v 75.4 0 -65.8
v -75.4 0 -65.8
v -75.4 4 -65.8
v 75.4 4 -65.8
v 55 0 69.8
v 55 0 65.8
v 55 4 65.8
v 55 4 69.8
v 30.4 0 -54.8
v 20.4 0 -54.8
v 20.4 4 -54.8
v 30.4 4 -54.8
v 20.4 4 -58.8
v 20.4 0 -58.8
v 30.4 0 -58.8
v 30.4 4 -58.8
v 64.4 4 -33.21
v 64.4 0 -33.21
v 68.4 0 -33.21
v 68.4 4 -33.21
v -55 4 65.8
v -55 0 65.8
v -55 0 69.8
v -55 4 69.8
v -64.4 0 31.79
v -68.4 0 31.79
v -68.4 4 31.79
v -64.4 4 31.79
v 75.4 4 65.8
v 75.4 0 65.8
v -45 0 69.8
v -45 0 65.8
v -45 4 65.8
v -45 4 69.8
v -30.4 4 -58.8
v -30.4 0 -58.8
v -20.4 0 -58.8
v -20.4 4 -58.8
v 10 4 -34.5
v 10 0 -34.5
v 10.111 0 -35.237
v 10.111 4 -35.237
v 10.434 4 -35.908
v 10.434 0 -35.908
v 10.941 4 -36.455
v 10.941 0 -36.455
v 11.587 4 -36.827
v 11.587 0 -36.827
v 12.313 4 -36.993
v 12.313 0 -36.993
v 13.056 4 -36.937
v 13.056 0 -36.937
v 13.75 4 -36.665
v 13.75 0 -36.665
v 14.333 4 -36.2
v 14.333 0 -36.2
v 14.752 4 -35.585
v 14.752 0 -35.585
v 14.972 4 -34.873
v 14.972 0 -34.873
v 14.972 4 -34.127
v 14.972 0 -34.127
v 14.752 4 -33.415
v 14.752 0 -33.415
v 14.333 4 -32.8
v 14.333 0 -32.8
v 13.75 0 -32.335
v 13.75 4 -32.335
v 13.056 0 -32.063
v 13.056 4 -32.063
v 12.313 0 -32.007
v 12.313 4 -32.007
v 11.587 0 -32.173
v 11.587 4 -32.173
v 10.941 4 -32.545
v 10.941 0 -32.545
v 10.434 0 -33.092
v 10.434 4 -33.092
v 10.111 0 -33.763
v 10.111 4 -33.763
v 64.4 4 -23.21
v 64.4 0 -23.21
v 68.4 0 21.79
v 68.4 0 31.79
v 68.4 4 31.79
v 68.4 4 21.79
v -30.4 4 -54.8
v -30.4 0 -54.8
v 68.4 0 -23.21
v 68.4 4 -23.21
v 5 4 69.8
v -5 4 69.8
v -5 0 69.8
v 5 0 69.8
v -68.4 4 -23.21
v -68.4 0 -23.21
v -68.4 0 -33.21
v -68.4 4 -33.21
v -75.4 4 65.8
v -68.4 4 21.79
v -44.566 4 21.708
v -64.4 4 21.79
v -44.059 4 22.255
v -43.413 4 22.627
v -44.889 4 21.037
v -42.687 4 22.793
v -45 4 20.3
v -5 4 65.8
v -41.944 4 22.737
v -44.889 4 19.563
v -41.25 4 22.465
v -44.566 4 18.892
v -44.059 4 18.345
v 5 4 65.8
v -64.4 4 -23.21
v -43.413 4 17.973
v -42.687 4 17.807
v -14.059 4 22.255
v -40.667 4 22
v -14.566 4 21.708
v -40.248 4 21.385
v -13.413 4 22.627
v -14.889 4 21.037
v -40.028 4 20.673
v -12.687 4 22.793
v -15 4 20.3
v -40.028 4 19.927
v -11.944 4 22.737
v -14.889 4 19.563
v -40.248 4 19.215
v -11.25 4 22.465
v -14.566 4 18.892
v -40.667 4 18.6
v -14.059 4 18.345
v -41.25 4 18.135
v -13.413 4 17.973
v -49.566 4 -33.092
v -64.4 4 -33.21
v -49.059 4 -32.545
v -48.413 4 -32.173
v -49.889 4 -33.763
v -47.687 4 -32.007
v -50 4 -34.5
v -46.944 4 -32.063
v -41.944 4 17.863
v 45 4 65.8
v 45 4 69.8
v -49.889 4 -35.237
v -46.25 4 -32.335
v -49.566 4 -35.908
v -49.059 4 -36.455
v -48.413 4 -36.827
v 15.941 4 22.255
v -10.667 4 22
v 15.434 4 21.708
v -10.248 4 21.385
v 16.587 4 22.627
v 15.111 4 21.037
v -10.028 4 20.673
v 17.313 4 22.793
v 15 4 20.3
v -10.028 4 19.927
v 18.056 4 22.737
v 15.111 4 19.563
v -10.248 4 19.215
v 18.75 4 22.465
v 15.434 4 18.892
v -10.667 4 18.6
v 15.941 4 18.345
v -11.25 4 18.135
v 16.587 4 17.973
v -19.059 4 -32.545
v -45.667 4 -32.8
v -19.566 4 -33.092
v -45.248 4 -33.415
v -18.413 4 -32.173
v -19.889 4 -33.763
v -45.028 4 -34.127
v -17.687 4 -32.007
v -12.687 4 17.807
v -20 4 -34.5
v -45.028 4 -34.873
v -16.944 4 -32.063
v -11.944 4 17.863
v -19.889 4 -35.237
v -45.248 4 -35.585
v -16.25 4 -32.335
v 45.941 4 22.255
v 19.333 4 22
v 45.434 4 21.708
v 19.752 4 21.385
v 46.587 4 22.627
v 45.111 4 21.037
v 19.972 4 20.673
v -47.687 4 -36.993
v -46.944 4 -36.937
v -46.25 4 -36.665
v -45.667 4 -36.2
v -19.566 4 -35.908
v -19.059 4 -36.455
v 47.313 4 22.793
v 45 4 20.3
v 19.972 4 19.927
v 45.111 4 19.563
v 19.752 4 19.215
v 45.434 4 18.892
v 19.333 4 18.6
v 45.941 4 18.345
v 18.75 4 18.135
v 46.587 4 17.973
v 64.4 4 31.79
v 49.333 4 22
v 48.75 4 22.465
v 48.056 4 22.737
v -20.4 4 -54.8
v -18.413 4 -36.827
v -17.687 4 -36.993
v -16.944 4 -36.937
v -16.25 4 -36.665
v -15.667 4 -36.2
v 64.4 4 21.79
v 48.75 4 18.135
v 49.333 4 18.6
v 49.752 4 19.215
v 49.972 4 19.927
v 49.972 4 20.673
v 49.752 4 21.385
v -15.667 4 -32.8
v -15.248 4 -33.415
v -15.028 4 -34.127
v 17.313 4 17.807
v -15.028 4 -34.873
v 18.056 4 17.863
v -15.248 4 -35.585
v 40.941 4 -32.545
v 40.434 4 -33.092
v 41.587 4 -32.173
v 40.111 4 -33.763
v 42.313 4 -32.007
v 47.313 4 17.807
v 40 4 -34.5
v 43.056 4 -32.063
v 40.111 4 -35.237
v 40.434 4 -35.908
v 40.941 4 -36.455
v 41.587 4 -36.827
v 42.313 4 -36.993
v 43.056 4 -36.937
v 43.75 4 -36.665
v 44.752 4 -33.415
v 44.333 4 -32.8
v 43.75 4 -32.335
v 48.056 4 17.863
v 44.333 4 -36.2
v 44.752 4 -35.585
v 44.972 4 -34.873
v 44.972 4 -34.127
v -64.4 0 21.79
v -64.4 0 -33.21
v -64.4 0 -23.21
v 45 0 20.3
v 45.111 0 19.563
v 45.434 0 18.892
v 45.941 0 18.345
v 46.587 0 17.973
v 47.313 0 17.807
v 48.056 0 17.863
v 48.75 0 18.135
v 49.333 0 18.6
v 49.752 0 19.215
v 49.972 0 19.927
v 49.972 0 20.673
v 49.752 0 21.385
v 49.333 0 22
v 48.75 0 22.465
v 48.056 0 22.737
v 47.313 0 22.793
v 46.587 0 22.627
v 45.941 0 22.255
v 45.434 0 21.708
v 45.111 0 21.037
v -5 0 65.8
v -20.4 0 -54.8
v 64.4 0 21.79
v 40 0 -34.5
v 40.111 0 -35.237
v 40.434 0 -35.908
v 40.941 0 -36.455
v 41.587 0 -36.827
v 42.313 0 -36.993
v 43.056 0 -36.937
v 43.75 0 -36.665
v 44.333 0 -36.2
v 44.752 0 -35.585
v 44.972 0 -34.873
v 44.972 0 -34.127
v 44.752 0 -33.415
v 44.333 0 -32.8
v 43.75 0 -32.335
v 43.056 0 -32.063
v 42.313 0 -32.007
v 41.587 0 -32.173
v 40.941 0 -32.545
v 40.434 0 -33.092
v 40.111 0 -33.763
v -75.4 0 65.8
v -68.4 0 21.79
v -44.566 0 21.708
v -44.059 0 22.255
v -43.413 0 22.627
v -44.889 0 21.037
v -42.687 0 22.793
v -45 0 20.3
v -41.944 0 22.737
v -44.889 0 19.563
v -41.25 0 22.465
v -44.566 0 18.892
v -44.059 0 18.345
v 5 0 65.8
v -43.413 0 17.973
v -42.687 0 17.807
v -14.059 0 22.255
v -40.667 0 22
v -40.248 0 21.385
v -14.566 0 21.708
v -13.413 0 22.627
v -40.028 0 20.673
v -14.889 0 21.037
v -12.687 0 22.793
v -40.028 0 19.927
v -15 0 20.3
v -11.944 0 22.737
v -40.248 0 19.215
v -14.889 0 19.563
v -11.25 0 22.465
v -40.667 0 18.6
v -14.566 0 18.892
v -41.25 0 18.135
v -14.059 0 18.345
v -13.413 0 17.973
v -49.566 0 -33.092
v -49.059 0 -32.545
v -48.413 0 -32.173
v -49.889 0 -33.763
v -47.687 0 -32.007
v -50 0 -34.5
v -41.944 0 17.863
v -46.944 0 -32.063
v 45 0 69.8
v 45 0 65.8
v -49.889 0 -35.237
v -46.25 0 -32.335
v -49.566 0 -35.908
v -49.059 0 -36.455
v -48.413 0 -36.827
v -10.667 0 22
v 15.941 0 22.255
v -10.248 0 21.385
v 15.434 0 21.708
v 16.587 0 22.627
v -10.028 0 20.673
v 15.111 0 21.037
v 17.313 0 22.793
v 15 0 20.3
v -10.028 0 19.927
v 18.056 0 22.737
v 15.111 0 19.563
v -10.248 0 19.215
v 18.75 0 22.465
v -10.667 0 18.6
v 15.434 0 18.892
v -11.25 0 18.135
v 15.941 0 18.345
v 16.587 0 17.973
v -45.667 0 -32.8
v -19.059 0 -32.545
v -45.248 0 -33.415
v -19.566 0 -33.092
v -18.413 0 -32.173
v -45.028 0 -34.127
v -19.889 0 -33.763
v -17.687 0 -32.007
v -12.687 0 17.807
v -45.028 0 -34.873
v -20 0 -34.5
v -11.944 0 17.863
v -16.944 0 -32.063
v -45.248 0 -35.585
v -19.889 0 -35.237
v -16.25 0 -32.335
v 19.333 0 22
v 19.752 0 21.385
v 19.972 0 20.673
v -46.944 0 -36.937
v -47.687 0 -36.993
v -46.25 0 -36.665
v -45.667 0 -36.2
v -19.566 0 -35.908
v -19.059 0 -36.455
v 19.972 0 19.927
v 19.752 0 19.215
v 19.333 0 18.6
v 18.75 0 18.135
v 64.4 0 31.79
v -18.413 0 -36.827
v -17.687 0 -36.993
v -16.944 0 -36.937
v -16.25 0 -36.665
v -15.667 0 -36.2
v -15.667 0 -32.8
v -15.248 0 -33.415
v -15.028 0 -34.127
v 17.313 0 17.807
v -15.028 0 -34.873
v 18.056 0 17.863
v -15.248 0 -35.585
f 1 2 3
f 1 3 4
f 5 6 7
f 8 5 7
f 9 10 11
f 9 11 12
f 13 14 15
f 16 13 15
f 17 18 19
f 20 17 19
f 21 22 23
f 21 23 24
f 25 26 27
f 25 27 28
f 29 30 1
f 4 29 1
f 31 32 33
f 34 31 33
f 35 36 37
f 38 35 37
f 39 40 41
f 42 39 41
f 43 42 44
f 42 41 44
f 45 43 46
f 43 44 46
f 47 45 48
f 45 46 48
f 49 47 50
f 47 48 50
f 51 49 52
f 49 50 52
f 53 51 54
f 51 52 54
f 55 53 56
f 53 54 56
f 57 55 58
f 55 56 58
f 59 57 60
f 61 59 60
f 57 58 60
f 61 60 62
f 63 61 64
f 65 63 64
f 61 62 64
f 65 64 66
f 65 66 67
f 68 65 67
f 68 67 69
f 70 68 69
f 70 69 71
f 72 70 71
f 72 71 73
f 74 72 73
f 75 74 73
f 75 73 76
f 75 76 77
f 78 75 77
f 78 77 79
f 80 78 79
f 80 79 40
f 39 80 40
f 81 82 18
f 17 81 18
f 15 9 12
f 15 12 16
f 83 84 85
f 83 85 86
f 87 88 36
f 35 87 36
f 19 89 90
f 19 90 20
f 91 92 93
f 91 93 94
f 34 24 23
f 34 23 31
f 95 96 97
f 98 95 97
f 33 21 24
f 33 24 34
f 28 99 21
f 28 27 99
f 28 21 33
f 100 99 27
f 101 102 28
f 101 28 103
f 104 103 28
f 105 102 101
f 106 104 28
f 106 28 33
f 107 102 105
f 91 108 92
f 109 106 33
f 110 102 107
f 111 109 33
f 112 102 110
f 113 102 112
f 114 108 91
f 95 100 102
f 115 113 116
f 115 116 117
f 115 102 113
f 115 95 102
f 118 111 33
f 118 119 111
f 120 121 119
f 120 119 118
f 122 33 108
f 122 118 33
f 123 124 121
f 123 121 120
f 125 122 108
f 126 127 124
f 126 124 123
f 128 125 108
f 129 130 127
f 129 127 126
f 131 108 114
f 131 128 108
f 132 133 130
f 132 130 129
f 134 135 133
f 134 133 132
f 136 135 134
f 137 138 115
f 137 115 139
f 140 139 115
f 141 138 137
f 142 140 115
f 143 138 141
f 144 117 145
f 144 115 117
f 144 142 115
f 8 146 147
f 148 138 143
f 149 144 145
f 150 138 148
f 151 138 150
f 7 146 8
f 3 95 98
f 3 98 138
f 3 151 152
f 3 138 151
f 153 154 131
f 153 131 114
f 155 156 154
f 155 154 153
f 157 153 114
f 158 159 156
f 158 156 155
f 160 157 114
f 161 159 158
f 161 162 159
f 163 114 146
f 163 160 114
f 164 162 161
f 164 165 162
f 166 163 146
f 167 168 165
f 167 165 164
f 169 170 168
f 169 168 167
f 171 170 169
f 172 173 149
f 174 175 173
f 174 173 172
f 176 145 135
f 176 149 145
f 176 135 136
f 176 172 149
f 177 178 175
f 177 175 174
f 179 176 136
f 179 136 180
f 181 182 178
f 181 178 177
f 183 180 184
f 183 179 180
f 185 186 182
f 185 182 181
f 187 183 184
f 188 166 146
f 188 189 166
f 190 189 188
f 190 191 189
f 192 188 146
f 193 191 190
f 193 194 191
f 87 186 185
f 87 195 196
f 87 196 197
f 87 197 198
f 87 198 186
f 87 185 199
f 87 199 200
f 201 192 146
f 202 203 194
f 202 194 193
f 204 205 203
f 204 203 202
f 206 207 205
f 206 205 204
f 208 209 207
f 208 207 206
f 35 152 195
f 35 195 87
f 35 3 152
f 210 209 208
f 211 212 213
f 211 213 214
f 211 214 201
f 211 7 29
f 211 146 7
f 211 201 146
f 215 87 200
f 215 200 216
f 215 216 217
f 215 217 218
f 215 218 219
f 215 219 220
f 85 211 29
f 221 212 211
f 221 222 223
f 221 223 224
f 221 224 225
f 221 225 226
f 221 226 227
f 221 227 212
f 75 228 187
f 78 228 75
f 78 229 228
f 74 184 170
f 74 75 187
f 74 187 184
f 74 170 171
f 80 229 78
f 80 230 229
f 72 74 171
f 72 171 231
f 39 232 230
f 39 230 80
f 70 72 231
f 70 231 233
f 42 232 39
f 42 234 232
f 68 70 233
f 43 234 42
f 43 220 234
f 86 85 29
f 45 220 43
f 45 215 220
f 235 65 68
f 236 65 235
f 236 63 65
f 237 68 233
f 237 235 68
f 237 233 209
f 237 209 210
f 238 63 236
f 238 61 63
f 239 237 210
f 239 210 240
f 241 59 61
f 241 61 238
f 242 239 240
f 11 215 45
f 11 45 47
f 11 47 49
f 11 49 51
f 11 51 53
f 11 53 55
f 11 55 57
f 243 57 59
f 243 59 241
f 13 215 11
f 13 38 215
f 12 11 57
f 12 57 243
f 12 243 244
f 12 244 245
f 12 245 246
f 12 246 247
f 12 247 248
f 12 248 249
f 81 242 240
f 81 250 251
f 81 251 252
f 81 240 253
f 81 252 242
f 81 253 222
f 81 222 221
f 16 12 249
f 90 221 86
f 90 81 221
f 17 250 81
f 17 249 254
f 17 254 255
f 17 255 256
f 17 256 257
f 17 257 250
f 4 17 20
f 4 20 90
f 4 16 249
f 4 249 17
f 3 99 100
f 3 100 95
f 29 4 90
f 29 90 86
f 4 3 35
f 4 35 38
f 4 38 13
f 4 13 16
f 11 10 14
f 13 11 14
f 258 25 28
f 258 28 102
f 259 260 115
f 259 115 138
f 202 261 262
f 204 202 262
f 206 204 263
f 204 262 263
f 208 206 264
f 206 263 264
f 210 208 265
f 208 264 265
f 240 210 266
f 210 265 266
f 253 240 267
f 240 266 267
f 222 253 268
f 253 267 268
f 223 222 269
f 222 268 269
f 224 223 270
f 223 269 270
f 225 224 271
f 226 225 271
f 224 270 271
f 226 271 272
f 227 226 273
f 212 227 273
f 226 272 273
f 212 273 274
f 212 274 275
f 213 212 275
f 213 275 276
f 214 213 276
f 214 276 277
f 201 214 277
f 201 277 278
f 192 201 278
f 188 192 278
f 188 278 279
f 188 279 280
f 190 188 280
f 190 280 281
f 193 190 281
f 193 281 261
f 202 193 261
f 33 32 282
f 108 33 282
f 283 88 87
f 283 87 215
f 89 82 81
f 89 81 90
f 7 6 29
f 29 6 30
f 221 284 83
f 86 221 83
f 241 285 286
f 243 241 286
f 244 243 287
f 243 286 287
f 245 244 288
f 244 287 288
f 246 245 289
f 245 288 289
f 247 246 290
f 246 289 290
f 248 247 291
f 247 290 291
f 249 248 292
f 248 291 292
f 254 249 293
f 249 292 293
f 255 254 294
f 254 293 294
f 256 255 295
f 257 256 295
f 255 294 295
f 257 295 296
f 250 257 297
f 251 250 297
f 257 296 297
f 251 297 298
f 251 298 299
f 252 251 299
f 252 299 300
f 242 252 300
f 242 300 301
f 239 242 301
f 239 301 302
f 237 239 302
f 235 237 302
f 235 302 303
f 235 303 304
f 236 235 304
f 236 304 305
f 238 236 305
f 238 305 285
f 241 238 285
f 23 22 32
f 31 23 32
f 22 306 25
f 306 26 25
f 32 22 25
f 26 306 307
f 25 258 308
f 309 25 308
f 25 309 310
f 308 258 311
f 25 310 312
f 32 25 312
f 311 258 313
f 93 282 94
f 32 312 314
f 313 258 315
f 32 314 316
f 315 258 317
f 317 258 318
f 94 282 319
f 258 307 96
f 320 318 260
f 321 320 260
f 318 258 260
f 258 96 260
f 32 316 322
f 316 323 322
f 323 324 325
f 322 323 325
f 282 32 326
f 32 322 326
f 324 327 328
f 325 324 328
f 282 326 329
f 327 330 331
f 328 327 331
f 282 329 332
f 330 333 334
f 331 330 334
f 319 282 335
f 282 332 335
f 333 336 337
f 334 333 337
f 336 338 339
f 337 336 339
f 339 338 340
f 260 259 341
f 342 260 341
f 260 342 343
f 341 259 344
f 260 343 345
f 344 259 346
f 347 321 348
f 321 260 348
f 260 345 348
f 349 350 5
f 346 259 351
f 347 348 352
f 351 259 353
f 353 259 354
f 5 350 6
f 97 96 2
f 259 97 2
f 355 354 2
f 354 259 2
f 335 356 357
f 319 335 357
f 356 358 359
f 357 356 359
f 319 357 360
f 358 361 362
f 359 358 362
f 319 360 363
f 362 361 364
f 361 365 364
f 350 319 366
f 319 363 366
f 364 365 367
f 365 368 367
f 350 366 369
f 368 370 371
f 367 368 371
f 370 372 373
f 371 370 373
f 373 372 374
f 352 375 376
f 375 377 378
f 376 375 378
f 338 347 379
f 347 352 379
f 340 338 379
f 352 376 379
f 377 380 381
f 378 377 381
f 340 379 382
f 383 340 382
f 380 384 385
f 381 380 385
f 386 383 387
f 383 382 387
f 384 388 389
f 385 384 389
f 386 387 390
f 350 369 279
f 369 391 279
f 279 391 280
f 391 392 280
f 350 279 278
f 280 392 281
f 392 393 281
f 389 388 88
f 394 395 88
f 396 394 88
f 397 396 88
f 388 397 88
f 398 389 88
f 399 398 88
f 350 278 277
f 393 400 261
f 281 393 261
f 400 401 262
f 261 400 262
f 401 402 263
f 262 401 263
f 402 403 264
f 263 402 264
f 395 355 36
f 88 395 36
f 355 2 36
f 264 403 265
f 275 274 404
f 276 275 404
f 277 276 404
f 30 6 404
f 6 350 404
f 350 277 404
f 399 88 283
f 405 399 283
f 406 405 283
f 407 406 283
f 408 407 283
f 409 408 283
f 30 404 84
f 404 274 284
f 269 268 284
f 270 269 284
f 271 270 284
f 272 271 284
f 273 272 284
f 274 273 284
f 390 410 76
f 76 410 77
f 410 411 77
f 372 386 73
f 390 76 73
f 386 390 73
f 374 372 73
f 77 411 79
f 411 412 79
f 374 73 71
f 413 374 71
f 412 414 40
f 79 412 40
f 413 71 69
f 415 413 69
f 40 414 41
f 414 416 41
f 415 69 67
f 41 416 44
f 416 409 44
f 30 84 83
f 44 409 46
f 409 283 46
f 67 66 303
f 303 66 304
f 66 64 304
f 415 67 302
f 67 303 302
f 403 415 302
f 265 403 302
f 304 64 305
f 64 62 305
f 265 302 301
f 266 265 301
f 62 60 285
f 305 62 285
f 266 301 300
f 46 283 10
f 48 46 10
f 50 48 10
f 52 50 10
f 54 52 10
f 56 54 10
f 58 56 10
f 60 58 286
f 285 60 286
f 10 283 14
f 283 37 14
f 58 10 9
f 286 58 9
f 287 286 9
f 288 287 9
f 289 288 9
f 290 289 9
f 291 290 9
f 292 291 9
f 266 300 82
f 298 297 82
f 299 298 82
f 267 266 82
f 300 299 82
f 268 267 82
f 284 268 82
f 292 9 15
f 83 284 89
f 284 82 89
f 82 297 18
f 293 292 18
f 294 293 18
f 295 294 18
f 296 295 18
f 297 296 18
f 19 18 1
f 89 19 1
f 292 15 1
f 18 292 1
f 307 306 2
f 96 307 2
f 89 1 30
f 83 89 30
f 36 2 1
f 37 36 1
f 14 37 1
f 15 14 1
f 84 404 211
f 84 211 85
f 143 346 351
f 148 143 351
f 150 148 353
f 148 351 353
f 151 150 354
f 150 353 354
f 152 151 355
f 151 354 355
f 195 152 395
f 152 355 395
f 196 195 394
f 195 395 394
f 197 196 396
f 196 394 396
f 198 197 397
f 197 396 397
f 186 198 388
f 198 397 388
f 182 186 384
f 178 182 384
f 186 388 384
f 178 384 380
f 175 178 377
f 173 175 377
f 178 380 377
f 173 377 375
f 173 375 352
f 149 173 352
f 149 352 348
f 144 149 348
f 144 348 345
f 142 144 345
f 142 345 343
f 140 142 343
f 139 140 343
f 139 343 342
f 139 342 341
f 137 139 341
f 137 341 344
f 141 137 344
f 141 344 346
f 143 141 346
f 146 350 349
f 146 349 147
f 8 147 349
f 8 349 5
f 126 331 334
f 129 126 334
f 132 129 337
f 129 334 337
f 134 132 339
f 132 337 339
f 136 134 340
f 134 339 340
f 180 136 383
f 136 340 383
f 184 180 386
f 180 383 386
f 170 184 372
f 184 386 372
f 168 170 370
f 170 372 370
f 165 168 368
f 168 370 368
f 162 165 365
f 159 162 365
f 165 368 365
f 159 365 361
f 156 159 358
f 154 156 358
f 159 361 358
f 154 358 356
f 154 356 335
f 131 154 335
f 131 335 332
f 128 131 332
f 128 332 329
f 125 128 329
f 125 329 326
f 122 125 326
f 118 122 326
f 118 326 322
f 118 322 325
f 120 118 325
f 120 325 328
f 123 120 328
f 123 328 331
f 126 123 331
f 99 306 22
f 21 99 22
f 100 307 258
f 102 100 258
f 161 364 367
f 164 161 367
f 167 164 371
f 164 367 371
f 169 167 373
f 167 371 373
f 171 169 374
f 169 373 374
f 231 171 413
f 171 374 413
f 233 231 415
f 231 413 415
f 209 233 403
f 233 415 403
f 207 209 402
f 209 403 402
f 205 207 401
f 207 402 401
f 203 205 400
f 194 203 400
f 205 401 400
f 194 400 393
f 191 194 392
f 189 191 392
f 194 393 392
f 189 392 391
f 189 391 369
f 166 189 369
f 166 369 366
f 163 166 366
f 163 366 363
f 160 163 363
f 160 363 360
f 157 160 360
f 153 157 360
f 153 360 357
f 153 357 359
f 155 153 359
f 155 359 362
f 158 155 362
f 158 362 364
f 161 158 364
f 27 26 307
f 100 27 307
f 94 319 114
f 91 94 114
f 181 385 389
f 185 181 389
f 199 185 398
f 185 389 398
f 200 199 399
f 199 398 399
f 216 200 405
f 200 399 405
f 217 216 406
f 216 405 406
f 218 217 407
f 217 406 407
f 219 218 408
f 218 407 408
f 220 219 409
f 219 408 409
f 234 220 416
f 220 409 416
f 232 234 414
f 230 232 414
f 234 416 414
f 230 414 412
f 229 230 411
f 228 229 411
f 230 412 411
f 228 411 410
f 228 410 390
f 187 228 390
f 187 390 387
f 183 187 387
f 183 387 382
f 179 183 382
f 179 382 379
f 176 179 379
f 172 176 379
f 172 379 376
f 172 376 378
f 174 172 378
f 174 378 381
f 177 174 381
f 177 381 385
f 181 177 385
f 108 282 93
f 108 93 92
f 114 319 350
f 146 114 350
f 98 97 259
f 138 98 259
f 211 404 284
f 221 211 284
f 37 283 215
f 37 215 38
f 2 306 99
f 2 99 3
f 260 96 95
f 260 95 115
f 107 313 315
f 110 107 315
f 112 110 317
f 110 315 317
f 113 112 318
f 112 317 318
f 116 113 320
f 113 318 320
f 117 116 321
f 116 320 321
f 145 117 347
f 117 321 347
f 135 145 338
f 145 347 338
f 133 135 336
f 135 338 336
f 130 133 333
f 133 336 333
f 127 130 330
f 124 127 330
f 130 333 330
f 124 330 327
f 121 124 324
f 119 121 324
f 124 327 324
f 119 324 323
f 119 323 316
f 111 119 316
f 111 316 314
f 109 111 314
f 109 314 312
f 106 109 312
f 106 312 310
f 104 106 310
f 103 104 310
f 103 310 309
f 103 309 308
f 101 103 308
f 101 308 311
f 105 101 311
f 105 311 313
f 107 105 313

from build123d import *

# Parameters (mm, degrees)
SKETCH1_W               = 150.8
SKETCH1_H               = 131.6
BOSS_EXTRUDE1_DEPTH     = 4
F_5_0MM_DOWEL_HOLE1_D   = 5
F_5_0MM_DOWEL_HOLE2_D   = 5
CAVITY1_START           = -58.8
CAVITY1_OUTLINE_W       = 10
CAVITY1_OUTLINE_H       = 3.997862951
CAVITY1_DEPTH           = 4
CAVITY1_START_2         = -33.210330997
CAVITY1_2_OUTLINE_W     = 4
CAVITY1_2_OUTLINE_H     = 3.997862951
CAVITY1_2_DEPTH         = 10
CAVITY1_START_3         = 21.789669003
CAVITY1_3_OUTLINE_W     = 4
CAVITY1_3_OUTLINE_H     = 3.997862951
CAVITY1_3_DEPTH         = 10
CUT_EXTRUDE6_DEPTH      = 101.153796274
CUT_EXTRUDE6_DEPTH_BACK = 101.153796274
SKETCH14_W              = 4
SKETCH14_H              = 10
SKETCH14_W_2            = 10
SKETCH14_H_2            = 4
SKETCH15_W              = 10
SKETCH15_H              = 4
BOSS_EXTRUDE2_DEPTH     = 4


# Read off the part's stored shape, not the designer's step: Cavity1
with BuildPart() as part:
    # Sketch1 → Boss-Extrude1 (new body)
    with BuildSketch(Plane(origin=(0, 0, 0), x_dir=(1, 0, 0), z_dir=(0, 1, 0))):
        Rectangle(SKETCH1_W, SKETCH1_H)
    extrude(amount=BOSS_EXTRUDE1_DEPTH)

    # Ø5.0mm Dowel Hole1 (through all)
    with Locations(Plane(origin=(0, 4, 0), x_dir=(1, 0, 0), z_dir=(0, 1, 0))):
        with Locations((-42.5, -20.3)):
            Hole(F_5_0MM_DOWEL_HOLE1_D / 2)

    # Ø5.0mm Dowel Hole2 (through all)
    with Locations(Plane(origin=(0, 4, 0), x_dir=(1, 0, 0), z_dir=(0, 1, 0))):
        with Locations((-12.5, -20.3), (17.5, -20.3), (47.5, -20.3), (-47.5, 34.5), (-17.5, 34.5), (12.5, 34.5), (42.5, 34.5)):
            Hole(F_5_0MM_DOWEL_HOLE2_D / 2)

    # Cavity1 outline → Cavity1 (cut)
    with BuildSketch(Plane.XY.offset(CAVITY1_START)):
        with Locations((25.4, 2.001068524)):
            Rectangle(CAVITY1_OUTLINE_W, CAVITY1_OUTLINE_H)
        with Locations((-25.4, 2.001068524)):
            Rectangle(CAVITY1_OUTLINE_W, CAVITY1_OUTLINE_H)
    extrude(amount=CAVITY1_DEPTH, mode=Mode.SUBTRACT)

    # Cavity1 2 outline → Cavity1 2 (cut)
    with BuildSketch(Plane.XY.offset(CAVITY1_START_2)):
        with Locations((-66.4, 2.001068524)):
            Rectangle(CAVITY1_2_OUTLINE_W, CAVITY1_2_OUTLINE_H)
        with Locations((66.4, 2.001068524)):
            Rectangle(CAVITY1_2_OUTLINE_W, CAVITY1_2_OUTLINE_H)
    extrude(amount=CAVITY1_2_DEPTH, mode=Mode.SUBTRACT)

    # Cavity1 3 outline → Cavity1 3 (cut)
    with BuildSketch(Plane.XY.offset(CAVITY1_START_3)):
        with Locations((-66.4, 2.001068524)):
            Rectangle(CAVITY1_3_OUTLINE_W, CAVITY1_3_OUTLINE_H)
        with Locations((66.4, 2.001068524)):
            Rectangle(CAVITY1_3_OUTLINE_W, CAVITY1_3_OUTLINE_H)
    extrude(amount=CAVITY1_3_DEPTH, mode=Mode.SUBTRACT)

    # Sketch14 → Cut-Extrude6 (cut, two sides: drawn at the far end of the back side and taken through both)
    with BuildSketch(Plane(origin=(0, 0.002137049, 0), x_dir=(1, 0, 0), z_dir=(0, 1, 0)).offset(-CUT_EXTRUDE6_DEPTH_BACK)):
        with Locations((-66.4, -26.789669003)):
            Rectangle(SKETCH14_W, SKETCH14_H)
        with Locations((-66.4, 28.210330997)):
            Rectangle(SKETCH14_W, SKETCH14_H)
        with Locations((25.4, 56.8)):
            Rectangle(SKETCH14_W_2, SKETCH14_H_2)
        with Locations((-25.4, 56.8)):
            Rectangle(SKETCH14_W_2, SKETCH14_H_2)
        with Locations((66.4, 28.210330997)):
            Rectangle(SKETCH14_W, SKETCH14_H)
        with Locations((66.4, -26.789669003)):
            Rectangle(SKETCH14_W, SKETCH14_H)
    extrude(amount=CUT_EXTRUDE6_DEPTH + CUT_EXTRUDE6_DEPTH_BACK, mode=Mode.SUBTRACT)

    # Sketch15 → Boss-Extrude2 (add)
    with BuildSketch(Plane.XY.offset(65.8)):
        with Locations((-50, 2)):
            Rectangle(SKETCH15_W, SKETCH15_H)
        with Locations((0, 2)):
            Rectangle(SKETCH15_W, SKETCH15_H)
        with Locations((50, 2)):
            Rectangle(SKETCH15_W, SKETCH15_H)
    extrude(amount=BOSS_EXTRUDE2_DEPTH)


solid = part.part
